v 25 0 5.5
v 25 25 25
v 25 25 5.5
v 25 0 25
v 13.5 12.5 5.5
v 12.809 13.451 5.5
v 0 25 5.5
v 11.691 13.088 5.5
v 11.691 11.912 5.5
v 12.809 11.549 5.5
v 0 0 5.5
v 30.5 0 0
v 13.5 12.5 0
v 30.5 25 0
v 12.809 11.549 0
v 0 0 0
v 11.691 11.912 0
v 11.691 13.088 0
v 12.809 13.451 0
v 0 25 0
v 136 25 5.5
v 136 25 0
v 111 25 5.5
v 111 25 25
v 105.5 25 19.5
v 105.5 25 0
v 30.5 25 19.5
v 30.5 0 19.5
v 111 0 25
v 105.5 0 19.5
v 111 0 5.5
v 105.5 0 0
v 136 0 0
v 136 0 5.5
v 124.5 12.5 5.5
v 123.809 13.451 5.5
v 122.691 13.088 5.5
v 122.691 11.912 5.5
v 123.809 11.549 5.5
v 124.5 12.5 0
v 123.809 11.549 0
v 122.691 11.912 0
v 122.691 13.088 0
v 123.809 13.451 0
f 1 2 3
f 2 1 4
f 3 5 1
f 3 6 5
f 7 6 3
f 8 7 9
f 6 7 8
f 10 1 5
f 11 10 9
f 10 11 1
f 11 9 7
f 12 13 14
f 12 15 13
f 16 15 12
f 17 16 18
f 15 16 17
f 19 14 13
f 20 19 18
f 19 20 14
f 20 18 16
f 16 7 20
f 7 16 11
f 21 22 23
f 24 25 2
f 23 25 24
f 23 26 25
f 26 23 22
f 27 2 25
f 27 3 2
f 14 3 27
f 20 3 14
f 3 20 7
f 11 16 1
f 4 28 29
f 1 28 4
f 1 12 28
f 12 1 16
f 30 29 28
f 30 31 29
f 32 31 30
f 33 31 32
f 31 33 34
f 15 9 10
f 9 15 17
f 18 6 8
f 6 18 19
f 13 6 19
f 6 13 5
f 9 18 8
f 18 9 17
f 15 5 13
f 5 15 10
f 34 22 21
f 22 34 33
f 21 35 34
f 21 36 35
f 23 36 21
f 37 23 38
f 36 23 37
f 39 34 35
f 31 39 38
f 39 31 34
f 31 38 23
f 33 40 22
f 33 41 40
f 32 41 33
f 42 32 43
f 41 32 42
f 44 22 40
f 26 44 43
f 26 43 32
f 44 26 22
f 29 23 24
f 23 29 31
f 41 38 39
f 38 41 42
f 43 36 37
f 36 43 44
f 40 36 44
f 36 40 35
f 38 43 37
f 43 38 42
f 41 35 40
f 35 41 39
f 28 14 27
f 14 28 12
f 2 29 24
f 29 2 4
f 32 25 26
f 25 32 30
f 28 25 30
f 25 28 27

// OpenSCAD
/* This drawing is for completely parameterized strap-type of bracket. Originally it was designed for the Curt powered tailight converter - since they do not produce them. 
*/

//Dimensions of box
bheightz = 19.5; //height of box **** Z-Axis  - Size of space under bracket
//bwidthx = 56.25;  //width of box
bwidthx = 75;  //width of box *** X-Axis
bracketwidthy = 25; // width of bracket **** Y-Axis
wingdepthx = 25; //originally 25 *** X-Axis
material_thicknessz = 5.5;  // X-Axis

//Lower Piece variables
b_lower = [wingdepthx,bracketwidthy, material_thicknessz]; // lower extension
plate= [bwidthx, bracketwidthy, material_thicknessz]; //top covering

b_vertical= [material_thicknessz,bracketwidthy,   bheightz + material_thicknessz];//vertical part (2 of them), length is bheightz _+ material thickness
b_vertical2= [material_thicknessz,bracketwidthy,  bheightz + material_thicknessz];//vertical part (2 of them), length is bheightz _+ material thickness
b_lower2 = [wingdepthx,bracketwidthy,material_thicknessz];
center_hole_x = bracketwidthy / 2;
center_hold_y = wingdepthx / 2;
hole_diameter = 2;

//Holes
hole_dm = 3;
hole_margin = 4;
adjustment_for_seeing_hole = 1.05; //To adjust the Z or height of the hole so it can be seen

//Build the bracket
//First Wing and Hole
difference(){
cube(b_lower);
translate([wingdepthx/2,bracketwidthy/2, -.025]) color("red") cylinder(material_thicknessz  * adjustment_for_seeing_hole);
}


translate([wingdepthx, 0, 0]) cube(b_vertical);
translate([wingdepthx + material_thicknessz, 0, bheightz]) cube(plate);
translate([wingdepthx + material_thicknessz+bwidthx, 0, 0]) cube(b_vertical2);

//Add Hole to second wing
difference(){
translate([wingdepthx + (2*material_thicknessz)+bwidthx, 0, 0]) cube(b_lower2);
    //take total length and back off 1/2 of wing depth
translate([((wingdepthx * 2) + (2*material_thicknessz)+bwidthx) - (wingdepthx / 2)
   ,bracketwidthy/2, -.025]) color("red") cylinder(material_thicknessz  * adjustment_for_seeing_hole);
}
